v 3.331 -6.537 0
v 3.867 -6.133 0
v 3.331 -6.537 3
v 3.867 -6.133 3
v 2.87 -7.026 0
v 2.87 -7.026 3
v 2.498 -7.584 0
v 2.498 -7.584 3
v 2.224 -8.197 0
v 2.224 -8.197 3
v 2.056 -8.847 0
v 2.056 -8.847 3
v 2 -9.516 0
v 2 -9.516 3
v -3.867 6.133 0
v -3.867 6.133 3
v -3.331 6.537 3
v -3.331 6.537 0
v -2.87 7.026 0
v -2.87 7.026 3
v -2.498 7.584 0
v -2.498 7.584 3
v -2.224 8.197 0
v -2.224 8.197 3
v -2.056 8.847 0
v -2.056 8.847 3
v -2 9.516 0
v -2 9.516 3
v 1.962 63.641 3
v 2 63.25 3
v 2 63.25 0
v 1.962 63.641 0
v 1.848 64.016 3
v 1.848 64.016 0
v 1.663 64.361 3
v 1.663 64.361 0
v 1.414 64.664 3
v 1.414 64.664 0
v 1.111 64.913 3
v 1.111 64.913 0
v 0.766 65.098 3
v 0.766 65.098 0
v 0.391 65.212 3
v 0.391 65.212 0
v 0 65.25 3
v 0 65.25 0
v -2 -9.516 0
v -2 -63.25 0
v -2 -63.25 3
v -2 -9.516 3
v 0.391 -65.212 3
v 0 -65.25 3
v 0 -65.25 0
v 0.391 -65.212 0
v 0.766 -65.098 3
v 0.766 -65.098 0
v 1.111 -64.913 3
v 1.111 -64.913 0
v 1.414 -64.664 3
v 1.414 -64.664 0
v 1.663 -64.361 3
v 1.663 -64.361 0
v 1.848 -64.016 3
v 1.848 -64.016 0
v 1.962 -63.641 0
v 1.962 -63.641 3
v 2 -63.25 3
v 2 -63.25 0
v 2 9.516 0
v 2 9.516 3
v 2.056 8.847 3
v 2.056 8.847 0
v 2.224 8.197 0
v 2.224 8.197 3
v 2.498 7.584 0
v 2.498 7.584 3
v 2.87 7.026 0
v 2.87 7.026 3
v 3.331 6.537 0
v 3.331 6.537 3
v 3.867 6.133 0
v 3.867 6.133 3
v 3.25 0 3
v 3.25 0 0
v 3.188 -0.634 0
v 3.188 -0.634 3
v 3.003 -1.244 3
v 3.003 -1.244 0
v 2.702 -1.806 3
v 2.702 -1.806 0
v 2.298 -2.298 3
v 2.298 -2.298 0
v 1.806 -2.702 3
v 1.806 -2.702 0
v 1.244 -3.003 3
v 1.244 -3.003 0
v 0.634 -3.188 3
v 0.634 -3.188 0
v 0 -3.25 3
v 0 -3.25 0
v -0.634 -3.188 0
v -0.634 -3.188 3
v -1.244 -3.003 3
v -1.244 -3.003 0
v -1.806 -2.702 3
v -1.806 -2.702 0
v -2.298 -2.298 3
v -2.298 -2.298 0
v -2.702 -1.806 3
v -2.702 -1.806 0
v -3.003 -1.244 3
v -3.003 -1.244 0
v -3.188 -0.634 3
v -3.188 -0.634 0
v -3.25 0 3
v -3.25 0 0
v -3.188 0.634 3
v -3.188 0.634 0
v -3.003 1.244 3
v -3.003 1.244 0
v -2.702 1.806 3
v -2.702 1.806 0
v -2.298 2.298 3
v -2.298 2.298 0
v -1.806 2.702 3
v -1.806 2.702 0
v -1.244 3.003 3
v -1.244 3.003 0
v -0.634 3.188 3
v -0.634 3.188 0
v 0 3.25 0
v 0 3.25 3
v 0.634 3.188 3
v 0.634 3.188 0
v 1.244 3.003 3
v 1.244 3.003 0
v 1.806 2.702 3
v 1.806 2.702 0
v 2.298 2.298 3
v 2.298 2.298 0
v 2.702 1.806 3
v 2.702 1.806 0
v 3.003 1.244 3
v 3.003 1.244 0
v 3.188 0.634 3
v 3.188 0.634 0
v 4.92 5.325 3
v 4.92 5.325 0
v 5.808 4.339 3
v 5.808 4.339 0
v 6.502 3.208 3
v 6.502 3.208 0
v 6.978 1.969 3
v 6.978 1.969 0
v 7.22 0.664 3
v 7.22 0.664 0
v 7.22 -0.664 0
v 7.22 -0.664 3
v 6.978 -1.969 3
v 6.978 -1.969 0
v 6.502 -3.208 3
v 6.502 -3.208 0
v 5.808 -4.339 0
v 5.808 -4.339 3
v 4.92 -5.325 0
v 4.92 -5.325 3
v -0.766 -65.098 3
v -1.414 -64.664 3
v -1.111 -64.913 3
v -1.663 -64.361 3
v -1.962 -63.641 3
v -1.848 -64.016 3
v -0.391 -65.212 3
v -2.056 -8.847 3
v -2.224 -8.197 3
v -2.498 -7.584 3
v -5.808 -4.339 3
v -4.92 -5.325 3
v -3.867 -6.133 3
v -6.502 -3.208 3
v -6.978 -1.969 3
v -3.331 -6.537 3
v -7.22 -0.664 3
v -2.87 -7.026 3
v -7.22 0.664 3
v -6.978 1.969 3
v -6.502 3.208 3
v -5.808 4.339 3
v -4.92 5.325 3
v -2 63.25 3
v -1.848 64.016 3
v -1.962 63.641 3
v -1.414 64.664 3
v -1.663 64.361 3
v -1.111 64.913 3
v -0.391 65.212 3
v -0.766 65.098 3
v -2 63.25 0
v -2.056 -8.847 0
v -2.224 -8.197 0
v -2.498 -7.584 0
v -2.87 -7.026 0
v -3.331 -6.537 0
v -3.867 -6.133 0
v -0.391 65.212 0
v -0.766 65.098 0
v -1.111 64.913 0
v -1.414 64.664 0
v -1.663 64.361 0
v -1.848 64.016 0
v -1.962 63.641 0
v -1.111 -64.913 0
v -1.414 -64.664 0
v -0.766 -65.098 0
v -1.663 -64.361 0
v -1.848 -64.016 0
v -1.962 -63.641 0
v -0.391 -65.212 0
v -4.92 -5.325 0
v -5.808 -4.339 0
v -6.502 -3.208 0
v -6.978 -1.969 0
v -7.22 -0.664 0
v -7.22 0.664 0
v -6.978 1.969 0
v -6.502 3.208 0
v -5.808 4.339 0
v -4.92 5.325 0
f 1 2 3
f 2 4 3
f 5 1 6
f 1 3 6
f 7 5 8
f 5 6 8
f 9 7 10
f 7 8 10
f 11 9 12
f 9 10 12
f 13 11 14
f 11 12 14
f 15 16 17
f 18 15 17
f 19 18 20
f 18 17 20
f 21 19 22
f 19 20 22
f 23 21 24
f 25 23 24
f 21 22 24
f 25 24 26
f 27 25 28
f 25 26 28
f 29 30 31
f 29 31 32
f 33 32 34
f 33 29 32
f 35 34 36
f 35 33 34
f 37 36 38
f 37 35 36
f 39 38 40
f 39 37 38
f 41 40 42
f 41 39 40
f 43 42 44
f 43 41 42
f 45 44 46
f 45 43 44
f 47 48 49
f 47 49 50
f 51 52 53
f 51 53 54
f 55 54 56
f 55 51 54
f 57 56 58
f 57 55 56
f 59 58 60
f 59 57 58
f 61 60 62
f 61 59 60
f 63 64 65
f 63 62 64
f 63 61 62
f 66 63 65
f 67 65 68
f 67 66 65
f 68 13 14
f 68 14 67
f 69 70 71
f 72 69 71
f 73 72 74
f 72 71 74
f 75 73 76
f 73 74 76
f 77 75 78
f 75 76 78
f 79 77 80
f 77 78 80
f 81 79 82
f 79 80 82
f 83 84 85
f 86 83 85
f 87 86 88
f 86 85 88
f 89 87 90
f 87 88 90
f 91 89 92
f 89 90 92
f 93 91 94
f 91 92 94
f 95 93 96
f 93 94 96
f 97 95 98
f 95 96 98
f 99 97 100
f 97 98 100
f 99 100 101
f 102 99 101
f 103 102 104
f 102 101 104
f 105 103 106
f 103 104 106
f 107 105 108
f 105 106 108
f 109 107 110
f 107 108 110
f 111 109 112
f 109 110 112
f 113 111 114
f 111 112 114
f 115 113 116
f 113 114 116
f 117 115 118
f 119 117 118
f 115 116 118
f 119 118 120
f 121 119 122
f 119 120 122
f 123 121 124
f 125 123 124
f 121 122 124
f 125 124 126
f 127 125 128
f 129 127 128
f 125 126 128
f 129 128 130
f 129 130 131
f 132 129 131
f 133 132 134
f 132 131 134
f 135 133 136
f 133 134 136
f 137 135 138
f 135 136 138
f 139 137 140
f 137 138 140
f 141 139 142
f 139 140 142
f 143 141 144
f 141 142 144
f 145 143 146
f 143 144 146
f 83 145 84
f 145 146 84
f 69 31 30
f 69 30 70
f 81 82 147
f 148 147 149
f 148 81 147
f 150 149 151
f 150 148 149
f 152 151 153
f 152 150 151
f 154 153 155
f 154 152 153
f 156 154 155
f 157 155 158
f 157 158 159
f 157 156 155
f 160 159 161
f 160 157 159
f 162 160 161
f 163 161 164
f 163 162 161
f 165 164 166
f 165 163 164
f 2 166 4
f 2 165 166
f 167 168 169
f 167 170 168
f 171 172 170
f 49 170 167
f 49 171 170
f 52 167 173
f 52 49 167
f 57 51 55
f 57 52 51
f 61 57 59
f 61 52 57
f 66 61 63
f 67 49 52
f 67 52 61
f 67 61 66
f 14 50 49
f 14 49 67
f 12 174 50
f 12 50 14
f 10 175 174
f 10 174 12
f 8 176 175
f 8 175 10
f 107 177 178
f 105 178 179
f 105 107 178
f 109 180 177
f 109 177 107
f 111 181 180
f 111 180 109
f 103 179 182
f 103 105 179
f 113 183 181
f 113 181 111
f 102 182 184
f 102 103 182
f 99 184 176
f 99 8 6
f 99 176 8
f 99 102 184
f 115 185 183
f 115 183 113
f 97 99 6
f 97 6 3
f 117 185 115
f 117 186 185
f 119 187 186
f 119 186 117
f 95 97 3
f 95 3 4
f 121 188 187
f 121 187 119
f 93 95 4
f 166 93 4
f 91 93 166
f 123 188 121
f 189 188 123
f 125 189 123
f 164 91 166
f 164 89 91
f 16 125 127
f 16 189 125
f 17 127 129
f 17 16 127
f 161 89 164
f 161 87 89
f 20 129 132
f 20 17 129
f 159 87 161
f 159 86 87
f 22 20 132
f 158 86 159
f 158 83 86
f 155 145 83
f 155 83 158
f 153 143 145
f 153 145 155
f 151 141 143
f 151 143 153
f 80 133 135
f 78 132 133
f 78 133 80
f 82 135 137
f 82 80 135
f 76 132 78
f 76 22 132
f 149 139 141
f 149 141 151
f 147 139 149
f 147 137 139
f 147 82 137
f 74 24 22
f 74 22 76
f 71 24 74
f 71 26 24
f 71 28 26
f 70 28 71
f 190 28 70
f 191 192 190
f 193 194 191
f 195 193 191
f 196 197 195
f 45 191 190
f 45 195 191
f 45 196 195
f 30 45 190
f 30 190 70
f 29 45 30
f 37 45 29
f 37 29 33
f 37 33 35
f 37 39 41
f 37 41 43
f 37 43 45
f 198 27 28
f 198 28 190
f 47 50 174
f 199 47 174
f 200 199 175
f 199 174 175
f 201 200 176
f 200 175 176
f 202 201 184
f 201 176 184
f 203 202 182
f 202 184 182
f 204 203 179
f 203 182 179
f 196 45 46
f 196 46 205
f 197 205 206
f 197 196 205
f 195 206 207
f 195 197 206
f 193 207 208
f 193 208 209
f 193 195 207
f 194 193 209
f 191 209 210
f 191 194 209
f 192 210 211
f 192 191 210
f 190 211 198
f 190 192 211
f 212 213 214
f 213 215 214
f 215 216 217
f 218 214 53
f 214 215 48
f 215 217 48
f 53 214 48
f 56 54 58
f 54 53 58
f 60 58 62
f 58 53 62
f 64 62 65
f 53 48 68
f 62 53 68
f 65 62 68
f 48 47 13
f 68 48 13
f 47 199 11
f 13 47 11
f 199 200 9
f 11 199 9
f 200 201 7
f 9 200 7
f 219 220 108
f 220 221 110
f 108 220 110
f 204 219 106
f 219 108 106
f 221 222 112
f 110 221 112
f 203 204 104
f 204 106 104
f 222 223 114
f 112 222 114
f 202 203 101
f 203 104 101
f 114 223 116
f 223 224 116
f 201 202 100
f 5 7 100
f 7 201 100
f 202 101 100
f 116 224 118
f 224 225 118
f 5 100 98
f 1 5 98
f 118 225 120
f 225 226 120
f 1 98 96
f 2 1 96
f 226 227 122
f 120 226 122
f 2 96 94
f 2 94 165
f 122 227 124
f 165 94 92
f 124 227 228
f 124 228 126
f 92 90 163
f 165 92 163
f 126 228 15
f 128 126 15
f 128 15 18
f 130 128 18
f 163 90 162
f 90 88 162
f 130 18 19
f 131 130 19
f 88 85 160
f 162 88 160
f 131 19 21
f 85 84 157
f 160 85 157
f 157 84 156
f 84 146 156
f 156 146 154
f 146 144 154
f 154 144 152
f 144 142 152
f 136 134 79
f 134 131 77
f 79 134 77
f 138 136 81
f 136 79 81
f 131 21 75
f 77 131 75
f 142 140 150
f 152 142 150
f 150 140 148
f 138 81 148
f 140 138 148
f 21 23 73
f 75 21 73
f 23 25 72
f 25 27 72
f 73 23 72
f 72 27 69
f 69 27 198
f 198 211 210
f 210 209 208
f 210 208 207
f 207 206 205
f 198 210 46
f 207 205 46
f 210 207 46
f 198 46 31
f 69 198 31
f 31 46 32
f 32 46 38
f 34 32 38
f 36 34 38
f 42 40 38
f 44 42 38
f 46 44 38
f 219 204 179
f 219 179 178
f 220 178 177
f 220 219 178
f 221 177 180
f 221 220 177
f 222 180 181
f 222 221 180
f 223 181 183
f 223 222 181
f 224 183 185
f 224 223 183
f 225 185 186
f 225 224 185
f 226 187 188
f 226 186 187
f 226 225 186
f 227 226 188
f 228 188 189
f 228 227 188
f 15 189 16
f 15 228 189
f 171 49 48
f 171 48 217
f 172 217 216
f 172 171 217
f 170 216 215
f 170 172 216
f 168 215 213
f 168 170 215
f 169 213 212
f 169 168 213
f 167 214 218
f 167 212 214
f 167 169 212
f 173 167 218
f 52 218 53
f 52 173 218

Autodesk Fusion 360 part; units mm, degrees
sketch "Mixer arm" plane through (0, 0, 0) normal (0, 0, 1) x (1, 0, 0)
  circle A0 centre (0, 0) radius 7.25
  circle A1 centre (0, 0) radius 3.25
  line L0 (-2, 65.25) -> (2, 65.25)
  line L1 (2, 65.25) -> (2, 3.25)
  line L2 (2, 3.25) -> (-2, 3.25)
  line L3 (-2, 3.25) -> (-2, 65.25)
  line L4 (-2, -3.25) -> (2, -3.25)
  line L5 (2, -3.25) -> (2, -65.25)
  line L6 (2, -65.25) -> (-2, -65.25)
  line L7 (-2, -65.25) -> (-2, -3.25)
  line L8 (-2, -7.25) -> (2, -7.25)
  line L9 (-2, 7.25) -> (2, 7.25)
  dimension "d3" = 6.5
  dimension "d5" = 14.5
  dimension "d6" = 2
  dimension "d7" = 2
  dimension "d8" = 2
  dimension "d9" = 2
  dimension "d14" = 58
  dimension "d15" = 58
extrude "Extrude1" add sketch "Mixer arm" along normal blind 3 contours A0 A1 L1 L2 L4 L5 | A0 L1 L2 L3 | A0 L1 L9 | A0 L5 L8 | A0 L4 L5 L7 | A0 L3 L9 | L0 L1 L3 L9 | A0 L7 L8 | L5 L6 L7 L8 | A0 A1 L2 L3 L4 L7
fillet "Fillet1" radius 4 4 edges at (2, -6.9687, 1.5) (2, 6.9687, 1.5) (-2, 6.9687, 1.5) (-2, -6.9687, 1.5)
fillet "Fillet2" radius 2 4 edges at (2, 65.25, 1.5) (-2, 65.25, 1.5) (-2, -65.25, 1.5) (2, -65.25, 1.5)
equation "stainless_steel_thickness = 3 mm" comment "The thickness of the 316 stainless steel sheets to laser cut."
equation "hole_diameter = 6.5 mm"
equation "d3 = hole_diameter"
equation "arm_thickness = 4 mm"
equation "d5 = hole_diameter + 2 * arm_thickness"
equation "d6 = arm_thickness / 2"
equation "d7 = arm_thickness / 2"
equation "d8 = arm_thickness / 2"
equation "d9 = arm_thickness / 2"
equation "d10 = stainless_steel_thickness"
equation "arm_length_front = 58 mm"
equation "arm_length_back = 58 mm"
equation "d14 = arm_length_front"
equation "d15 = arm_length_back"
equation "d17 = arm_thickness"
equation "d19 = arm_thickness / 2"
